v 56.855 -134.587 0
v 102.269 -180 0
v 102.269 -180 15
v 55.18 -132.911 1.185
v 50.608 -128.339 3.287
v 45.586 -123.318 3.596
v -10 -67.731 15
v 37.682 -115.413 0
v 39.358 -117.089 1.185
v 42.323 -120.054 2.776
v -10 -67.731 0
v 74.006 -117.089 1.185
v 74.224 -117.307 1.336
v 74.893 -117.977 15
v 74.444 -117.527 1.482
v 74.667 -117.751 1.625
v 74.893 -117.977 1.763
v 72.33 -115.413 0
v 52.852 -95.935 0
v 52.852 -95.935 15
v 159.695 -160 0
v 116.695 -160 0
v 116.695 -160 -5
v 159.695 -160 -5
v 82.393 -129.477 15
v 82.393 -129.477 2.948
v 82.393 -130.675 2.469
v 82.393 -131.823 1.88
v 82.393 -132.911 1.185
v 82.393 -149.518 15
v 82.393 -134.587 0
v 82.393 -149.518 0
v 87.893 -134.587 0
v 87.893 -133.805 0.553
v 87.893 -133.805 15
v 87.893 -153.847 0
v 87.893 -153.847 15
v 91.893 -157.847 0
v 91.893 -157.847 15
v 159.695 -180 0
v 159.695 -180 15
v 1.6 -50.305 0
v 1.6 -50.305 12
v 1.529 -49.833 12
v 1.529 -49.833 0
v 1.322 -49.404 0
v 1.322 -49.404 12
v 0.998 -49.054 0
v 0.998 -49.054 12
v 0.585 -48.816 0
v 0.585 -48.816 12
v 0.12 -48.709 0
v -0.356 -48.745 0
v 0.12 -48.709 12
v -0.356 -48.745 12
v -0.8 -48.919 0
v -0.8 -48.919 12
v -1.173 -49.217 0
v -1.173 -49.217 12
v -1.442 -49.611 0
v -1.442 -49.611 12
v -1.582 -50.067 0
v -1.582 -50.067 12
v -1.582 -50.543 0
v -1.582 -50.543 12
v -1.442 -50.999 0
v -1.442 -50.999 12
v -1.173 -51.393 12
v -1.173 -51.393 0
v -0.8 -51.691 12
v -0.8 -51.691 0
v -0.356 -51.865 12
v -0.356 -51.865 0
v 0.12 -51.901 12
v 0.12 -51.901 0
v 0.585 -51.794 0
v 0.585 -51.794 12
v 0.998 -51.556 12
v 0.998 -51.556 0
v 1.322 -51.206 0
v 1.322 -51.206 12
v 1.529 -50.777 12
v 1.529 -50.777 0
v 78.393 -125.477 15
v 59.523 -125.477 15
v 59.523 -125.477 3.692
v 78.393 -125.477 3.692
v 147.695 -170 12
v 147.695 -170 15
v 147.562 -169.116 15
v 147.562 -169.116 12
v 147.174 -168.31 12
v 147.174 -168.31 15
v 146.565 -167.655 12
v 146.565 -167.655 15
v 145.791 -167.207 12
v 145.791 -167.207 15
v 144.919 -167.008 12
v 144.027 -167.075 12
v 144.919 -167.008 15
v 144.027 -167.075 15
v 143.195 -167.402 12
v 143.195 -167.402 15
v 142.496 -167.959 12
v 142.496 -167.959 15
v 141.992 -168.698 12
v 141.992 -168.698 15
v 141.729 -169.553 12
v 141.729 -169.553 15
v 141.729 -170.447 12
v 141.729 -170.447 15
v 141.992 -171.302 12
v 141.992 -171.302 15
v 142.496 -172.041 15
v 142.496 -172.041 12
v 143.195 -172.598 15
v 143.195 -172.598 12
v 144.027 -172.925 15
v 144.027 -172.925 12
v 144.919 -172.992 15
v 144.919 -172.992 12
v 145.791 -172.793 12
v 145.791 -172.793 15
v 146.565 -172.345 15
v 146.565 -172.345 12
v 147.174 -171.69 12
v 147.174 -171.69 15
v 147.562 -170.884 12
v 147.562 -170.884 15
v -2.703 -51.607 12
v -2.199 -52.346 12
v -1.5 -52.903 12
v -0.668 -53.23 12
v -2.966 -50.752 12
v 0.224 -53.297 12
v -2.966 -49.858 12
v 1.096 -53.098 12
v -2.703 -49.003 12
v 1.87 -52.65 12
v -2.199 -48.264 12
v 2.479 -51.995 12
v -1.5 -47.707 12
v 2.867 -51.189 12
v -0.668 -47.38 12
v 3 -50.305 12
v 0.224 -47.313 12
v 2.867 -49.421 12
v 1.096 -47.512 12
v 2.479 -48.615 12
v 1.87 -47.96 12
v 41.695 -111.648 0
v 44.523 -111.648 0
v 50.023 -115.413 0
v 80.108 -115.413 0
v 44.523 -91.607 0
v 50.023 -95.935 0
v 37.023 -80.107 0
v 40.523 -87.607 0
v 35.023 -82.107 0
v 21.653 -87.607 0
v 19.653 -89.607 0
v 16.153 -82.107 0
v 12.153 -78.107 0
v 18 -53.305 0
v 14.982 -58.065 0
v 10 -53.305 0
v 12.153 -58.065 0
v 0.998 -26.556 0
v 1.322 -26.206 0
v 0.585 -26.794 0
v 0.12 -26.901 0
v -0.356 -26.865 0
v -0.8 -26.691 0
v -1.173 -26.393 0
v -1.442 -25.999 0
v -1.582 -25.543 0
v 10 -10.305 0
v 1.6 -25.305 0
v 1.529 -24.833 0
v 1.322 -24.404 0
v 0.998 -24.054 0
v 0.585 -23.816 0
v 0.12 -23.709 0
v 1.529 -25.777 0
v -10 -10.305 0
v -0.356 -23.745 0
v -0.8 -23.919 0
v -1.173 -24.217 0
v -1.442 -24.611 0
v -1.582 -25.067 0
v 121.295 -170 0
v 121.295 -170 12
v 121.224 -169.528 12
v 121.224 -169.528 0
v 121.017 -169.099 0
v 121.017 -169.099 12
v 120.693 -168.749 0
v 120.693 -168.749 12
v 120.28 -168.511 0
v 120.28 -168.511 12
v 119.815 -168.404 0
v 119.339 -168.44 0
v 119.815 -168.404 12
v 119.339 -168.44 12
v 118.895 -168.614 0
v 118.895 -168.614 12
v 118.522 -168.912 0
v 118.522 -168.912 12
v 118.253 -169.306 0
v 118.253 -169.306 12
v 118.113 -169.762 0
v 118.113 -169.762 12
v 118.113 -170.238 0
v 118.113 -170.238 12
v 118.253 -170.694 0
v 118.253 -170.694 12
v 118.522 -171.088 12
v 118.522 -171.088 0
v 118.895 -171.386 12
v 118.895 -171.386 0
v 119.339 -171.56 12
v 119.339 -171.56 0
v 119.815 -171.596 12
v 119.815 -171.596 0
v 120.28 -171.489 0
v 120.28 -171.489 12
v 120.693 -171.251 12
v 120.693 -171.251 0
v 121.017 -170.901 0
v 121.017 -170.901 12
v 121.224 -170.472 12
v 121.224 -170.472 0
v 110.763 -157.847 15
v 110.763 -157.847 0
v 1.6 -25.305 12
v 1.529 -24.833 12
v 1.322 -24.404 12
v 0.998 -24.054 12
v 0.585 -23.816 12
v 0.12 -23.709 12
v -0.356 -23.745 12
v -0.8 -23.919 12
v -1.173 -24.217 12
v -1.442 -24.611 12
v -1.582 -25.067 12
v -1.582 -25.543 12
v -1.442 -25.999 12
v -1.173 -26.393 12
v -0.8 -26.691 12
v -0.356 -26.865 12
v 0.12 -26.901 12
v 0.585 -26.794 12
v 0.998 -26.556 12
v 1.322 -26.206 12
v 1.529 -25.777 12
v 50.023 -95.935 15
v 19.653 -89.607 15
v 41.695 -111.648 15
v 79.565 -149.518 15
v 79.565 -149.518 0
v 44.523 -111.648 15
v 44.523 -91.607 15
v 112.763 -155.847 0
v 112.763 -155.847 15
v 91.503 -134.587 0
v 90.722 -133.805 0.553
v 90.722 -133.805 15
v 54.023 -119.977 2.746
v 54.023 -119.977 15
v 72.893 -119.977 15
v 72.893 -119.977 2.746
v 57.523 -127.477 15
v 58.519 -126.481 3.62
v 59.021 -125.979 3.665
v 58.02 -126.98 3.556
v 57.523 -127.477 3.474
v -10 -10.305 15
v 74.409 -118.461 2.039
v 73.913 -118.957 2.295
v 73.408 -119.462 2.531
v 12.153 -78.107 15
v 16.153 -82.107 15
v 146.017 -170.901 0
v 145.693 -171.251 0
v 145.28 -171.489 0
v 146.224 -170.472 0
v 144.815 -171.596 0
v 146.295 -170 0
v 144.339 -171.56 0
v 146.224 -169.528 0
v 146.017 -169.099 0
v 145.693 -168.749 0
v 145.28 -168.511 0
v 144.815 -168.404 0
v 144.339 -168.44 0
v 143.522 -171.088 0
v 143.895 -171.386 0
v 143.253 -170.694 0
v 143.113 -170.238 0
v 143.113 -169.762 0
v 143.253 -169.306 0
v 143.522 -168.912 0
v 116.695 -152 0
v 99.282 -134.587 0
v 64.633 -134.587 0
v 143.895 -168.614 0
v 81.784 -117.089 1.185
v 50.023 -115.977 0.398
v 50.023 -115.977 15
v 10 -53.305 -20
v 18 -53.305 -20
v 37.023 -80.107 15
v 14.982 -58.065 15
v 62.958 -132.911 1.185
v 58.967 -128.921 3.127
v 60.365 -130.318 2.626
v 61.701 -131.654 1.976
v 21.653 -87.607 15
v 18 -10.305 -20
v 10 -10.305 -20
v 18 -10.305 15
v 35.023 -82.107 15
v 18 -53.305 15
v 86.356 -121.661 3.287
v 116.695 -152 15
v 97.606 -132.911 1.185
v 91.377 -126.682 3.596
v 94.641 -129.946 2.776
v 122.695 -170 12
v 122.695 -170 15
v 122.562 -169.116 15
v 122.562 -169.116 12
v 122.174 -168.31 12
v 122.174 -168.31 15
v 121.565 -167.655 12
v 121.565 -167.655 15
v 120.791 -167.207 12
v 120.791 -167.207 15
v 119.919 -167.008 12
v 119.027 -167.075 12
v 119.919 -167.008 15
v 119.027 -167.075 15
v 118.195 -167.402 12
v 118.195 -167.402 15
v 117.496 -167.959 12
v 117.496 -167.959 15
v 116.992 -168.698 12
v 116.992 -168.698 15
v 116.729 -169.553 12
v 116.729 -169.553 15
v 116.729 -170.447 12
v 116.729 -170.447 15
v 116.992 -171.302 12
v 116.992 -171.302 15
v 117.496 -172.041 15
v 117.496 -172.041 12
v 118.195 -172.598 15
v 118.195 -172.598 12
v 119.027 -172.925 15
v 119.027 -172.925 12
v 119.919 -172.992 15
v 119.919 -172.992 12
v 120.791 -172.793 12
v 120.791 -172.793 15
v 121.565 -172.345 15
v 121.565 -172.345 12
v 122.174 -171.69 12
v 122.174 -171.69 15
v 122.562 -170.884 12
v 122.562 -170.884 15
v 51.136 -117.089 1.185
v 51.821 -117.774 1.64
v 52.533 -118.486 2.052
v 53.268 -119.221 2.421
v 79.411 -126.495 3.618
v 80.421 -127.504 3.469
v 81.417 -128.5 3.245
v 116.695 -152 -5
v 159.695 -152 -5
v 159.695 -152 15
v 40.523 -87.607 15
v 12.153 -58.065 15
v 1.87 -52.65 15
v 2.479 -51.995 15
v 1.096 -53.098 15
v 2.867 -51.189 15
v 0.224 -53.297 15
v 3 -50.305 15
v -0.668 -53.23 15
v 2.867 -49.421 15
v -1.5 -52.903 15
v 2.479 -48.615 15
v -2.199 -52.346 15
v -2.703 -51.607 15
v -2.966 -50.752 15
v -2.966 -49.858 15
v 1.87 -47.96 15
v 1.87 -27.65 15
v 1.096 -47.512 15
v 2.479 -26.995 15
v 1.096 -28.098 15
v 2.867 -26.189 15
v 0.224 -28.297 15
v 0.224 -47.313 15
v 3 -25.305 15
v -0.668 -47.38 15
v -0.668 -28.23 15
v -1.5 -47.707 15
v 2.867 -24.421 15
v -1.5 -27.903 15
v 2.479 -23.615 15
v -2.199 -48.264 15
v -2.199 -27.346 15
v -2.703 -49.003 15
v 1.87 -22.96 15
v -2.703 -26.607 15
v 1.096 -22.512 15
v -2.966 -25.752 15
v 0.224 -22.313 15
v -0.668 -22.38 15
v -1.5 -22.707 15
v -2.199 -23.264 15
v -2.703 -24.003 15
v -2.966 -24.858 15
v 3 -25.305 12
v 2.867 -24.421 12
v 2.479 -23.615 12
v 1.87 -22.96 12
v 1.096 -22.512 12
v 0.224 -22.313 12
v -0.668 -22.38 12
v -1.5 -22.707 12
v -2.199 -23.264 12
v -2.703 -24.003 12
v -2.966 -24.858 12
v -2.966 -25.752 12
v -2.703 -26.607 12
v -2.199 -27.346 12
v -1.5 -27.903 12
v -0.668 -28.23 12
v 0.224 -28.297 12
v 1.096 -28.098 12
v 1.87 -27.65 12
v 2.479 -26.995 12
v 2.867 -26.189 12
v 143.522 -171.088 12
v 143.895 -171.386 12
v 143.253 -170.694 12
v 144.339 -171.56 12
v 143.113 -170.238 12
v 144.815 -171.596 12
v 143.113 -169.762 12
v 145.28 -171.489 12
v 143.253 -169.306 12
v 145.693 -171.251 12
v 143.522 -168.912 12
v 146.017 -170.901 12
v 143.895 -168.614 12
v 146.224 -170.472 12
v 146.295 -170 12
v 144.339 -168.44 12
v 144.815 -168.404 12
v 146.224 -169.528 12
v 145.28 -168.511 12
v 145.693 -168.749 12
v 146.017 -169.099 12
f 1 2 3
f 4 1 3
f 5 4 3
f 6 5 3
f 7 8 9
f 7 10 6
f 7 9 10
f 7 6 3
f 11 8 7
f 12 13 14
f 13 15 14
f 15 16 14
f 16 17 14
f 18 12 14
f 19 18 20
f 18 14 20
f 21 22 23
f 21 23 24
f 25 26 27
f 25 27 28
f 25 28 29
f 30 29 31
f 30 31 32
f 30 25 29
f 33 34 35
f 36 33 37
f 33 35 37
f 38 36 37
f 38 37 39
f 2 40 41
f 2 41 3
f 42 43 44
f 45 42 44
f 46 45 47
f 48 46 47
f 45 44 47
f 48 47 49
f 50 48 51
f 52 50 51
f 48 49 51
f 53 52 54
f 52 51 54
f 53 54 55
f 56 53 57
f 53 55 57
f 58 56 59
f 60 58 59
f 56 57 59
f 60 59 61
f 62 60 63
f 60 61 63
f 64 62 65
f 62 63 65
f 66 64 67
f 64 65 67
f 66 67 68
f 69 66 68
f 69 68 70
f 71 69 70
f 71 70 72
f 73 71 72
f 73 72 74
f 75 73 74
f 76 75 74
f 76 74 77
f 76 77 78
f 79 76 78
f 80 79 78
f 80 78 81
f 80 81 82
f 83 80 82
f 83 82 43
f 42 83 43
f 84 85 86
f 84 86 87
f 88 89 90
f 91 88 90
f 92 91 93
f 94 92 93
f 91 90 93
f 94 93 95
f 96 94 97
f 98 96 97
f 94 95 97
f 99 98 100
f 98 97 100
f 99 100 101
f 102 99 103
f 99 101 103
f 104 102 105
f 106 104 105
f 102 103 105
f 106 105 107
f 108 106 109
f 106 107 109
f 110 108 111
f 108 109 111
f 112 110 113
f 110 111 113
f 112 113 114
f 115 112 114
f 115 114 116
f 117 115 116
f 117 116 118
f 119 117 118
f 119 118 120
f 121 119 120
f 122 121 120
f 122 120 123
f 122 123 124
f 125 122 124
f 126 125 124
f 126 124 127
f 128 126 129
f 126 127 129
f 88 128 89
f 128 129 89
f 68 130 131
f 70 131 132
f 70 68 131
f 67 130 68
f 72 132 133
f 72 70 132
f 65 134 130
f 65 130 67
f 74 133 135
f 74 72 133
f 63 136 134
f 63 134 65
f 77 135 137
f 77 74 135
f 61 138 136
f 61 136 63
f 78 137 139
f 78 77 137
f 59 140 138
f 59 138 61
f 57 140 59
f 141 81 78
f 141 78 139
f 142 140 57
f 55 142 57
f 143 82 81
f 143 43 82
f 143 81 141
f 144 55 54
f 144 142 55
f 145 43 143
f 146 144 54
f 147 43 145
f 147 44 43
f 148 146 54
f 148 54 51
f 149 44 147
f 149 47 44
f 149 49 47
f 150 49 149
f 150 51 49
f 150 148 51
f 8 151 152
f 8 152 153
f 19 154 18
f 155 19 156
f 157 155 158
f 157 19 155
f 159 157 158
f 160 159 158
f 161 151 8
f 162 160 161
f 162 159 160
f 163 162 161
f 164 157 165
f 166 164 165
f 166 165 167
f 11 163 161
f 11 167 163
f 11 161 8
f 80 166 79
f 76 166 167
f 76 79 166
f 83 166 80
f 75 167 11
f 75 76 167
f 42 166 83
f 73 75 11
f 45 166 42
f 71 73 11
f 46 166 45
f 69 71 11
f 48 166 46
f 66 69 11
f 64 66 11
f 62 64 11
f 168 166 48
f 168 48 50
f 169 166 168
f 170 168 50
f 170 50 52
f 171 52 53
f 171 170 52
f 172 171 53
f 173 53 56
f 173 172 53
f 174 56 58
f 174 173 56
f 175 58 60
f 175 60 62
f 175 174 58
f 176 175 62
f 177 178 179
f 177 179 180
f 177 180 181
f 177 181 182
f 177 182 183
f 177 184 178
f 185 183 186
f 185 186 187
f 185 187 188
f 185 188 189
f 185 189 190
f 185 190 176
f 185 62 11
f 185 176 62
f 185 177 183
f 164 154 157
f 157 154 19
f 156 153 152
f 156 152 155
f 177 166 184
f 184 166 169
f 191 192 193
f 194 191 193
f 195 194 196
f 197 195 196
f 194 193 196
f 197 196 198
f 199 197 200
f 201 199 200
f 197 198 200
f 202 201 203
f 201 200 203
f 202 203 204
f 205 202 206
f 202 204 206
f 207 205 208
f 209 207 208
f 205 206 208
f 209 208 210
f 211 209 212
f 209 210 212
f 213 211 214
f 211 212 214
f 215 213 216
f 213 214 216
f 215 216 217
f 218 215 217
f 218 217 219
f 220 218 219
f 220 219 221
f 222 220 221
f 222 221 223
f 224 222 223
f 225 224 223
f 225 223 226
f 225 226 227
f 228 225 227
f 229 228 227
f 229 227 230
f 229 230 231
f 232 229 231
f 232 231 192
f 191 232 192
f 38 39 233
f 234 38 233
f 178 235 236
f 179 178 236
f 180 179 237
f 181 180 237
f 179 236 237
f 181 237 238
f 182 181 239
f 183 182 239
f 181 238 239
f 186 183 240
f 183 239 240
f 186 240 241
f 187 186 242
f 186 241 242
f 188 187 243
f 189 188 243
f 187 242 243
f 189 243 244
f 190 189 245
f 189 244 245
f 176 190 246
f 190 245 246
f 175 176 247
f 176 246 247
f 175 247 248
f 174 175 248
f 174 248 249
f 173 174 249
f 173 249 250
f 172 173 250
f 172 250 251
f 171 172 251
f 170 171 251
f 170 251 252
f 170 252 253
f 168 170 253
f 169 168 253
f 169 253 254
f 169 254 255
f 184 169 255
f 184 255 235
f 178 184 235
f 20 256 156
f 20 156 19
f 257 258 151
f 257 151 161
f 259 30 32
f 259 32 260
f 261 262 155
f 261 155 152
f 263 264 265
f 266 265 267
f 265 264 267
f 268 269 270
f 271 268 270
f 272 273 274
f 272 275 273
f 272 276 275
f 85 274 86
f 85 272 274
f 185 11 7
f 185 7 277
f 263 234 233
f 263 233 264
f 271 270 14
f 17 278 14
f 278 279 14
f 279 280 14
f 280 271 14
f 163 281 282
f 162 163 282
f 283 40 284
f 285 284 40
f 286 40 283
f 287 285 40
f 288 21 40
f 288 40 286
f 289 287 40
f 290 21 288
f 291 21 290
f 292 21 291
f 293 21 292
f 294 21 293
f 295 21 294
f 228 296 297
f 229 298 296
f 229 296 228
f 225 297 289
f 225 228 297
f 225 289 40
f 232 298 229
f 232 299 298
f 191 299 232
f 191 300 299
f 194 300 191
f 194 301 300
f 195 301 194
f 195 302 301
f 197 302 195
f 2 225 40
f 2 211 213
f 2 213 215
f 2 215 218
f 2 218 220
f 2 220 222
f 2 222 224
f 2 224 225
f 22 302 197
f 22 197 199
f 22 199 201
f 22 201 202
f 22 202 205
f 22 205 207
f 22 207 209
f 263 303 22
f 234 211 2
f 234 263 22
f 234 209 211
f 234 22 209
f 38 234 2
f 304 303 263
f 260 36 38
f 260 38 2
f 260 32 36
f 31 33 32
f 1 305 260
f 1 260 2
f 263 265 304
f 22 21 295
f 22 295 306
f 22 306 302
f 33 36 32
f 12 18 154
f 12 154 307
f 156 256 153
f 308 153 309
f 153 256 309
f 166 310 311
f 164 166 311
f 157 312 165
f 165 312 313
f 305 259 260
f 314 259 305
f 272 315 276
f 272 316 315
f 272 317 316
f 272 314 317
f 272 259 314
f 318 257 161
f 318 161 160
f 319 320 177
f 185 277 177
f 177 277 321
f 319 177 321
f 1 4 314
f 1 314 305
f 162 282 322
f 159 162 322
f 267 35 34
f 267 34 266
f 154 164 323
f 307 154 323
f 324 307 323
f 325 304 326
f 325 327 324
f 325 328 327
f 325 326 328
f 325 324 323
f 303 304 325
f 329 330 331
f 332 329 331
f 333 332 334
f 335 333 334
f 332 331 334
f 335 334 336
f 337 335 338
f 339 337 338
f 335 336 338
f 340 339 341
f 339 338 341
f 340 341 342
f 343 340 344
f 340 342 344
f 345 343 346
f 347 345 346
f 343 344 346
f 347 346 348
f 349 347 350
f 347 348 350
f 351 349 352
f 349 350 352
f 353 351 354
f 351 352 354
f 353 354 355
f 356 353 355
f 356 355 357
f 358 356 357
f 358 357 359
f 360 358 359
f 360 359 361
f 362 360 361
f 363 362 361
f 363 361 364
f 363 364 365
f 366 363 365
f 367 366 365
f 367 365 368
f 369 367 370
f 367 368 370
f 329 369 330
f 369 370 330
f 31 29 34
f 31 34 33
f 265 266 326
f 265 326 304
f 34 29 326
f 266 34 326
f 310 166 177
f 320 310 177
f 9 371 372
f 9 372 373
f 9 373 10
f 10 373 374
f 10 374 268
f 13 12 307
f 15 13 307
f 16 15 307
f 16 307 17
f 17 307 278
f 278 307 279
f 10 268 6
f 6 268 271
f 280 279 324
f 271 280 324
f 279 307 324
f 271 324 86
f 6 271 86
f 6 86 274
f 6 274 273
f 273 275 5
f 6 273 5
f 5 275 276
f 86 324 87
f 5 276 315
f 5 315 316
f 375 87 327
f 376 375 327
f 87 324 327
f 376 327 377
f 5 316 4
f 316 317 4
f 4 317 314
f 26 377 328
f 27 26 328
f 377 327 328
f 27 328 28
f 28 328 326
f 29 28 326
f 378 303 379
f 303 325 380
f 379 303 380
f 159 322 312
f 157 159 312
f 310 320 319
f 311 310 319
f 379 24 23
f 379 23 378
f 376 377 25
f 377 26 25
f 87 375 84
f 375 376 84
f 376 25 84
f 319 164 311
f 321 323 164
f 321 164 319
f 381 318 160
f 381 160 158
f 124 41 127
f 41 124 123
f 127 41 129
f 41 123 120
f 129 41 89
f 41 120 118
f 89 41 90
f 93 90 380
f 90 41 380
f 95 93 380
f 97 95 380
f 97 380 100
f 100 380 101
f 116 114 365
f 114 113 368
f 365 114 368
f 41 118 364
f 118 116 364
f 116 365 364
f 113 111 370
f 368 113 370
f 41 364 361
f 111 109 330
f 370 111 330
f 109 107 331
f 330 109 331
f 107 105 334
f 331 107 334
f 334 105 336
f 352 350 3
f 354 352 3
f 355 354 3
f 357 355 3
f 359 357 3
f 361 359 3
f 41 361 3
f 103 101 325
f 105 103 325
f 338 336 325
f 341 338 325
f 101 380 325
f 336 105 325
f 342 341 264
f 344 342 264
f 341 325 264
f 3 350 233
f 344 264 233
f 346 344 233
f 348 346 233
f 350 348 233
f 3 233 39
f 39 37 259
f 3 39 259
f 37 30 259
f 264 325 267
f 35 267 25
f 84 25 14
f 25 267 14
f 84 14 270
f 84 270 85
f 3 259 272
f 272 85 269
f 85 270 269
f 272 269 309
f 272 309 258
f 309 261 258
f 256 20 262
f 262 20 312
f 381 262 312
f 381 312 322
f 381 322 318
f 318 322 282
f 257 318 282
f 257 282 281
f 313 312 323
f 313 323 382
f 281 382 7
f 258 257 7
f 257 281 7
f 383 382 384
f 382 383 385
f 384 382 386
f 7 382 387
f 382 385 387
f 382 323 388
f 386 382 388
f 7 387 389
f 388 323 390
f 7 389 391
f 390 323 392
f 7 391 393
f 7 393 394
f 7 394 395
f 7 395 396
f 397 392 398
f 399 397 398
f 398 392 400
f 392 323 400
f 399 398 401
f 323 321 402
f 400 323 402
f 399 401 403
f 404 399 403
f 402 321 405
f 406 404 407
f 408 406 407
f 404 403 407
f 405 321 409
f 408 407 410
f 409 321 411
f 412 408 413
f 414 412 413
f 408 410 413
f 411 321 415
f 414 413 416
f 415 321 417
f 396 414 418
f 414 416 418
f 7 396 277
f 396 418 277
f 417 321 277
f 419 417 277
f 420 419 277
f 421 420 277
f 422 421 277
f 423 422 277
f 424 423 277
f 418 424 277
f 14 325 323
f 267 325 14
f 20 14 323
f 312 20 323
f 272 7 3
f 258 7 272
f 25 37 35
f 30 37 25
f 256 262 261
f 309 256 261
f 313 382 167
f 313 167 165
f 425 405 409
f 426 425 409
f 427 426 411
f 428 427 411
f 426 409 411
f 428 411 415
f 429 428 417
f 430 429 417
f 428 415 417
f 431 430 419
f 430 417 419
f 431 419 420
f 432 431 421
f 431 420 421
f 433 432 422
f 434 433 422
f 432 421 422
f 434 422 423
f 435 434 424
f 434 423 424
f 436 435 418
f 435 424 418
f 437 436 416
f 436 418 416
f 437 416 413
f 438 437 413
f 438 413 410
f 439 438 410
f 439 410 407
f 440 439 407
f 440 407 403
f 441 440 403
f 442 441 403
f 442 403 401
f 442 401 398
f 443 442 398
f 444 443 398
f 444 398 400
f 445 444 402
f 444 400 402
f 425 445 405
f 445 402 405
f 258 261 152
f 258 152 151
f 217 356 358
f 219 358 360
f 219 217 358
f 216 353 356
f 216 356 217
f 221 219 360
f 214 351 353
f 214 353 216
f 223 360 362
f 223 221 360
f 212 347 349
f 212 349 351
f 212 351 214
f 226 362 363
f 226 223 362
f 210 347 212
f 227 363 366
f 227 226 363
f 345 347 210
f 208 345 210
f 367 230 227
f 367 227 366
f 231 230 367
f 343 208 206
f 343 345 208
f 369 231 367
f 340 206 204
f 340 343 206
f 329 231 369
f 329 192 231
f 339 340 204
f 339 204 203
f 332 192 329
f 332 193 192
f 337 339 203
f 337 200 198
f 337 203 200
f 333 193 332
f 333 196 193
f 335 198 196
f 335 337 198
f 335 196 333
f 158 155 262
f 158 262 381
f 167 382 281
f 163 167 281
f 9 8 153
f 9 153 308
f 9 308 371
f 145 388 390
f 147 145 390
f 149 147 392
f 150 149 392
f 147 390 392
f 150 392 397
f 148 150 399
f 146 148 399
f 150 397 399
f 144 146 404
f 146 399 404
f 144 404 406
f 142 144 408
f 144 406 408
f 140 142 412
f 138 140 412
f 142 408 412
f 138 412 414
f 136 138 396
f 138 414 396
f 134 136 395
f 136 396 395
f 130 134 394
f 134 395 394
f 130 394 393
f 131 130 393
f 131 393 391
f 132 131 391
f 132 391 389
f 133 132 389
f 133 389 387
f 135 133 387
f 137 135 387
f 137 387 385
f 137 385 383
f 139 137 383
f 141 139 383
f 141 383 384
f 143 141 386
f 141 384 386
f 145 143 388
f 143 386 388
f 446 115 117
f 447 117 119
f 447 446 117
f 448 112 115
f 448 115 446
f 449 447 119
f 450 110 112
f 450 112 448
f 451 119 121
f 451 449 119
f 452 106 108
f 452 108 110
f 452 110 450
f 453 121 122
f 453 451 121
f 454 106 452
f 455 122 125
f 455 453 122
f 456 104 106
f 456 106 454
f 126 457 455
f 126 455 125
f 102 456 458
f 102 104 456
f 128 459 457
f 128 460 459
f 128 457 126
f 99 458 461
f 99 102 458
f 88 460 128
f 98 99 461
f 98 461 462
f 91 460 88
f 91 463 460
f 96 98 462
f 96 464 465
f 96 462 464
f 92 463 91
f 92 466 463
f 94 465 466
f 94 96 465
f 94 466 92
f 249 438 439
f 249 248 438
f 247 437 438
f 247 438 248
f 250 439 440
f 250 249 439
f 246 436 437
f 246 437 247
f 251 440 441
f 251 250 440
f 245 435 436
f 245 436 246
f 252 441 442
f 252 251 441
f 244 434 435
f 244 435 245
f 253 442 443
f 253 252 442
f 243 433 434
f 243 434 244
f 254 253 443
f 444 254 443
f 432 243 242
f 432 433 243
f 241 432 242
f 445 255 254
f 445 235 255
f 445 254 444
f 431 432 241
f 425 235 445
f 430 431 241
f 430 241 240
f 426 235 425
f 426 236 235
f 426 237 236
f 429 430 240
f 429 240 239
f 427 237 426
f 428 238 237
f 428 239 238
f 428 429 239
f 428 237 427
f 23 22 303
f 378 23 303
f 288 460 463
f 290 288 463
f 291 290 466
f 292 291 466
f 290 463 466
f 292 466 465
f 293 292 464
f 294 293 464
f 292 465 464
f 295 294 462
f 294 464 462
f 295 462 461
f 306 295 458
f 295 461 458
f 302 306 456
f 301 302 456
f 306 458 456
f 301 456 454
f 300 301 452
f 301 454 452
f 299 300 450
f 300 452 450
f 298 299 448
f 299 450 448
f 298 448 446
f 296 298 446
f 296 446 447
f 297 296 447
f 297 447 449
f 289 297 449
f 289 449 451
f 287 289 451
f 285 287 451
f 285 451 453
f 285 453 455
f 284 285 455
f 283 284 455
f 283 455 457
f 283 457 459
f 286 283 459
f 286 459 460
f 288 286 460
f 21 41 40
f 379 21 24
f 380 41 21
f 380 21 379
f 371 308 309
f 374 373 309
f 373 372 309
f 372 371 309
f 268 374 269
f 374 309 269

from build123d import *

# Parameters (mm, degrees)
EXTRUDE_1_DEPTH     = 15
SKETCH_3_W          = 43
SKETCH_3_H          = 8
EXTRUDE_2_DEPTH     = 35
SKETCH_4_W          = 8
SKETCH_4_H          = 43
EXTRUDE_3_DEPTH     = 35
CUT_EXTRUDE_1_DEPTH = 244.161454645
SKETCH_6_R          = 1.6
CUT_EXTRUDE_2_DEPTH = 244.161454645
SKETCH_7_R          = 3
CUT_EXTRUDE_3_DEPTH = 3
CHAMFER_1_SIZE      = 2.828427125
CHAMFER_1_SIZE_2    = 4
CUT_EXTRUDE_4_DEPTH = 133
SKETCH_9_W          = 15
SKETCH_9_H          = 8
CUT_EXTRUDE_5_DEPTH = 43


with BuildPart() as part:
    # 草图1 → 凸台-拉伸1 (new body)
    with BuildSketch(Plane.XY):
        Polygon((124.695, -160), (159.695, -160), (159.695, -180), (102.268593129, -180), (-10, -67.731406871), (-10, -10.305), (10, -10.305), (10, -45.305), align=None)
    extrude(amount=EXTRUDE_1_DEPTH)

    # 草图3 → 凸台-拉伸2 (add)
    with BuildSketch(Plane.XY.offset(15)):
        with Locations((138.195, -156)):
            Rectangle(SKETCH_3_W, SKETCH_3_H)
    extrude(amount=-EXTRUDE_2_DEPTH)

    # 草图4 → 凸台-拉伸3 (add)
    with BuildSketch(Plane.XY.offset(15)):
        with Locations((14, -31.805)):
            Rectangle(SKETCH_4_W, SKETCH_4_H)
    extrude(amount=-EXTRUDE_3_DEPTH)

    # 草图5 → 切除-拉伸1 (cut, through all)
    with BuildSketch(Plane.XY.offset(15)):
        Polygon((50.023383861, -93.106558454), (50.023383861, -119.976616139), (76.893441546, -119.976616139), align=None)
        Polygon((55.523383861, -125.476616139), (82.393441546, -125.476616139), (82.393441546, -152.346673824), align=None)
        Polygon((12.153326176, -55.236500769), (12.153326176, -82.106558454), (39.023383861, -82.106558454), align=None)
        Polygon((87.893441546, -130.976616139), (87.893441546, -157.846673824), (114.763499231, -157.846673824), align=None)
        Polygon((17.653326176, -87.606558454), (44.523383861, -87.606558454), (44.523383861, -114.476616139), align=None)
    extrude(amount=-CUT_EXTRUDE_1_DEPTH, mode=Mode.SUBTRACT)

    # 草图6 → 切除-拉伸2 (cut, through all)
    with BuildSketch(Plane.XY.offset(15)):
        with Locations((0, -50.305)):
            Circle(SKETCH_6_R)
        with Locations((0, -25.305)):
            Circle(SKETCH_6_R)
        with Locations((119.695, -170)):
            Circle(SKETCH_6_R)
        with Locations((144.695, -170)):
            Circle(SKETCH_6_R)
    extrude(amount=-CUT_EXTRUDE_2_DEPTH, mode=Mode.SUBTRACT)

    # 草图7 → 切除-拉伸3 (cut)
    with BuildSketch(Plane.XY.offset(15)):
        with Locations((0, -25.305)):
            Circle(SKETCH_7_R)
        with Locations((0, -50.305)):
            Circle(SKETCH_7_R)
        with Locations((119.695, -170)):
            Circle(SKETCH_7_R)
        with Locations((144.695, -170)):
            Circle(SKETCH_7_R)
    extrude(amount=-CUT_EXTRUDE_3_DEPTH, mode=Mode.SUBTRACT)

    # 倒角1
    # the kernel refuses this chamfer: 4, 2.828427125 mm, written as the material it adds along each edge
    with BuildSketch(Plane(origin=(82.393441546, -152.346673824, 15), x_dir=(0.05647824947248942, 0.9984038297885898, 0), z_dir=(0, 0, -1)), Plane(origin=(55.523383861, -125.476616139, 15), x_dir=(0.6660419652145875, -0.7459142715976752, 0), z_dir=(0, 0, -1)), Plane(origin=(87.893441546, -130.976616139, 15), x_dir=(-0.05647824947248942, -0.9984038297885898, 0), z_dir=(0, 0, -1)), Plane(origin=(12.153326176, -55.236500769, 15), x_dir=(-0.05647824947249038, -0.9984038297885897, 0), z_dir=(0, 0, -1)), Plane(origin=(44.523383861, -114.476616139, 15), x_dir=(0.05647824947248914, 0.9984038297885898, 0), z_dir=(0, 0, -1)), Plane(origin=(17.653326176, -87.606558454, 15), x_dir=(0.6660419652145882, -0.7459142715976745, 0), z_dir=(0, 0, -1)), Plane(origin=(50.023383861, -93.106558454, 15), x_dir=(-0.05647824947248914, -0.9984038297885898, 0), z_dir=(0, 0, -1))) as chamfer_1_piece_1:
        Polygon((CHAMFER_1_SIZE * 0.998403829699, -CHAMFER_1_SIZE * 0.0564782494674), (CHAMFER_1_SIZE_2 * 0.666041965215, -CHAMFER_1_SIZE_2 * 0.745914271598), (0, 0), align=None)
    extrude(amount=15)
    with BuildSketch(Plane(origin=(82.393441546, -125.476616139, 15), x_dir=(0.02749587661058555, -0.9996219169112968, 0), z_dir=(0, 0, -1)), Plane(origin=(87.893441546, -157.846673824, 15), x_dir=(-0.02749587661058555, 0.9996219169112968, 0), z_dir=(0, 0, -1)), Plane(origin=(12.153326176, -82.106558454, 15), x_dir=(-0.02749587661058651, 0.9996219169112968, 0), z_dir=(0, 0, -1)), Plane(origin=(44.523383861, -87.606558454, 15), x_dir=(0.027495876610585647, -0.9996219169112968, 0), z_dir=(0, 0, -1)), Plane(origin=(50.023383861, -119.976616139, 15), x_dir=(-0.027495876610585647, 0.9996219169112968, 0), z_dir=(0, 0, -1))) as chamfer_1_piece_2:
        Polygon((CHAMFER_1_SIZE_2 * 0.999621916911, CHAMFER_1_SIZE_2 * 0.0274958766106), (-CHAMFER_1_SIZE_2 * 0.0274958766106, CHAMFER_1_SIZE_2 * 0.999621916911), (0, 0), align=None)
    extrude(amount=15)
    with BuildSketch(Plane(origin=(114.763499231, -157.846673824, 15), x_dir=(-0.9996219169112968, -0.0274958766105891, 0), z_dir=(0, 0, -1)), Plane(origin=(39.023383861, -82.106558454, 15), x_dir=(-0.9996219169112968, -0.027495876610585647, 0), z_dir=(0, 0, -1)), Plane(origin=(76.893441546, -119.976616139, 15), x_dir=(-0.9996219169112968, -0.027495876610585647, 0), z_dir=(0, 0, -1))) as chamfer_1_piece_3:
        Polygon((CHAMFER_1_SIZE_2 * 0.999621916911, CHAMFER_1_SIZE_2 * 0.0274958766106), (CHAMFER_1_SIZE * 0.687396915203, CHAMFER_1_SIZE * 0.726281956812), (0, 0), align=None)
    extrude(amount=15)

    # 草图8 → 切除-拉伸4 (cut)
    with BuildSketch(Plane(origin=(159.695, 0, 0), x_dir=(0, 0, -1), z_dir=(1, 0, 0))):
        with BuildLine():
            Line((-1.18512051, -132.91098195), (0, -134.586598797))
            Line((0, -134.586598797), (0, -115.413471515))
            Line((0, -115.413471515), (-1.18512051, -117.089088362))
            ThreePointArc((-1.18512051, -117.089088362), (-3.7, -125.000035156), (-1.18512051, -132.91098195))
        make_face()
    extrude(amount=-CUT_EXTRUDE_4_DEPTH, mode=Mode.SUBTRACT)

    # 草图9 → 切除-拉伸5 (cut)
    with BuildSketch(Plane(origin=(159.695, 0, 0), x_dir=(0, 0, -1), z_dir=(1, 0, 0))):
        with Locations((12.5, -156)):
            Rectangle(SKETCH_9_W, SKETCH_9_H)
    extrude(amount=-CUT_EXTRUDE_5_DEPTH, mode=Mode.SUBTRACT)


solid = part.part
